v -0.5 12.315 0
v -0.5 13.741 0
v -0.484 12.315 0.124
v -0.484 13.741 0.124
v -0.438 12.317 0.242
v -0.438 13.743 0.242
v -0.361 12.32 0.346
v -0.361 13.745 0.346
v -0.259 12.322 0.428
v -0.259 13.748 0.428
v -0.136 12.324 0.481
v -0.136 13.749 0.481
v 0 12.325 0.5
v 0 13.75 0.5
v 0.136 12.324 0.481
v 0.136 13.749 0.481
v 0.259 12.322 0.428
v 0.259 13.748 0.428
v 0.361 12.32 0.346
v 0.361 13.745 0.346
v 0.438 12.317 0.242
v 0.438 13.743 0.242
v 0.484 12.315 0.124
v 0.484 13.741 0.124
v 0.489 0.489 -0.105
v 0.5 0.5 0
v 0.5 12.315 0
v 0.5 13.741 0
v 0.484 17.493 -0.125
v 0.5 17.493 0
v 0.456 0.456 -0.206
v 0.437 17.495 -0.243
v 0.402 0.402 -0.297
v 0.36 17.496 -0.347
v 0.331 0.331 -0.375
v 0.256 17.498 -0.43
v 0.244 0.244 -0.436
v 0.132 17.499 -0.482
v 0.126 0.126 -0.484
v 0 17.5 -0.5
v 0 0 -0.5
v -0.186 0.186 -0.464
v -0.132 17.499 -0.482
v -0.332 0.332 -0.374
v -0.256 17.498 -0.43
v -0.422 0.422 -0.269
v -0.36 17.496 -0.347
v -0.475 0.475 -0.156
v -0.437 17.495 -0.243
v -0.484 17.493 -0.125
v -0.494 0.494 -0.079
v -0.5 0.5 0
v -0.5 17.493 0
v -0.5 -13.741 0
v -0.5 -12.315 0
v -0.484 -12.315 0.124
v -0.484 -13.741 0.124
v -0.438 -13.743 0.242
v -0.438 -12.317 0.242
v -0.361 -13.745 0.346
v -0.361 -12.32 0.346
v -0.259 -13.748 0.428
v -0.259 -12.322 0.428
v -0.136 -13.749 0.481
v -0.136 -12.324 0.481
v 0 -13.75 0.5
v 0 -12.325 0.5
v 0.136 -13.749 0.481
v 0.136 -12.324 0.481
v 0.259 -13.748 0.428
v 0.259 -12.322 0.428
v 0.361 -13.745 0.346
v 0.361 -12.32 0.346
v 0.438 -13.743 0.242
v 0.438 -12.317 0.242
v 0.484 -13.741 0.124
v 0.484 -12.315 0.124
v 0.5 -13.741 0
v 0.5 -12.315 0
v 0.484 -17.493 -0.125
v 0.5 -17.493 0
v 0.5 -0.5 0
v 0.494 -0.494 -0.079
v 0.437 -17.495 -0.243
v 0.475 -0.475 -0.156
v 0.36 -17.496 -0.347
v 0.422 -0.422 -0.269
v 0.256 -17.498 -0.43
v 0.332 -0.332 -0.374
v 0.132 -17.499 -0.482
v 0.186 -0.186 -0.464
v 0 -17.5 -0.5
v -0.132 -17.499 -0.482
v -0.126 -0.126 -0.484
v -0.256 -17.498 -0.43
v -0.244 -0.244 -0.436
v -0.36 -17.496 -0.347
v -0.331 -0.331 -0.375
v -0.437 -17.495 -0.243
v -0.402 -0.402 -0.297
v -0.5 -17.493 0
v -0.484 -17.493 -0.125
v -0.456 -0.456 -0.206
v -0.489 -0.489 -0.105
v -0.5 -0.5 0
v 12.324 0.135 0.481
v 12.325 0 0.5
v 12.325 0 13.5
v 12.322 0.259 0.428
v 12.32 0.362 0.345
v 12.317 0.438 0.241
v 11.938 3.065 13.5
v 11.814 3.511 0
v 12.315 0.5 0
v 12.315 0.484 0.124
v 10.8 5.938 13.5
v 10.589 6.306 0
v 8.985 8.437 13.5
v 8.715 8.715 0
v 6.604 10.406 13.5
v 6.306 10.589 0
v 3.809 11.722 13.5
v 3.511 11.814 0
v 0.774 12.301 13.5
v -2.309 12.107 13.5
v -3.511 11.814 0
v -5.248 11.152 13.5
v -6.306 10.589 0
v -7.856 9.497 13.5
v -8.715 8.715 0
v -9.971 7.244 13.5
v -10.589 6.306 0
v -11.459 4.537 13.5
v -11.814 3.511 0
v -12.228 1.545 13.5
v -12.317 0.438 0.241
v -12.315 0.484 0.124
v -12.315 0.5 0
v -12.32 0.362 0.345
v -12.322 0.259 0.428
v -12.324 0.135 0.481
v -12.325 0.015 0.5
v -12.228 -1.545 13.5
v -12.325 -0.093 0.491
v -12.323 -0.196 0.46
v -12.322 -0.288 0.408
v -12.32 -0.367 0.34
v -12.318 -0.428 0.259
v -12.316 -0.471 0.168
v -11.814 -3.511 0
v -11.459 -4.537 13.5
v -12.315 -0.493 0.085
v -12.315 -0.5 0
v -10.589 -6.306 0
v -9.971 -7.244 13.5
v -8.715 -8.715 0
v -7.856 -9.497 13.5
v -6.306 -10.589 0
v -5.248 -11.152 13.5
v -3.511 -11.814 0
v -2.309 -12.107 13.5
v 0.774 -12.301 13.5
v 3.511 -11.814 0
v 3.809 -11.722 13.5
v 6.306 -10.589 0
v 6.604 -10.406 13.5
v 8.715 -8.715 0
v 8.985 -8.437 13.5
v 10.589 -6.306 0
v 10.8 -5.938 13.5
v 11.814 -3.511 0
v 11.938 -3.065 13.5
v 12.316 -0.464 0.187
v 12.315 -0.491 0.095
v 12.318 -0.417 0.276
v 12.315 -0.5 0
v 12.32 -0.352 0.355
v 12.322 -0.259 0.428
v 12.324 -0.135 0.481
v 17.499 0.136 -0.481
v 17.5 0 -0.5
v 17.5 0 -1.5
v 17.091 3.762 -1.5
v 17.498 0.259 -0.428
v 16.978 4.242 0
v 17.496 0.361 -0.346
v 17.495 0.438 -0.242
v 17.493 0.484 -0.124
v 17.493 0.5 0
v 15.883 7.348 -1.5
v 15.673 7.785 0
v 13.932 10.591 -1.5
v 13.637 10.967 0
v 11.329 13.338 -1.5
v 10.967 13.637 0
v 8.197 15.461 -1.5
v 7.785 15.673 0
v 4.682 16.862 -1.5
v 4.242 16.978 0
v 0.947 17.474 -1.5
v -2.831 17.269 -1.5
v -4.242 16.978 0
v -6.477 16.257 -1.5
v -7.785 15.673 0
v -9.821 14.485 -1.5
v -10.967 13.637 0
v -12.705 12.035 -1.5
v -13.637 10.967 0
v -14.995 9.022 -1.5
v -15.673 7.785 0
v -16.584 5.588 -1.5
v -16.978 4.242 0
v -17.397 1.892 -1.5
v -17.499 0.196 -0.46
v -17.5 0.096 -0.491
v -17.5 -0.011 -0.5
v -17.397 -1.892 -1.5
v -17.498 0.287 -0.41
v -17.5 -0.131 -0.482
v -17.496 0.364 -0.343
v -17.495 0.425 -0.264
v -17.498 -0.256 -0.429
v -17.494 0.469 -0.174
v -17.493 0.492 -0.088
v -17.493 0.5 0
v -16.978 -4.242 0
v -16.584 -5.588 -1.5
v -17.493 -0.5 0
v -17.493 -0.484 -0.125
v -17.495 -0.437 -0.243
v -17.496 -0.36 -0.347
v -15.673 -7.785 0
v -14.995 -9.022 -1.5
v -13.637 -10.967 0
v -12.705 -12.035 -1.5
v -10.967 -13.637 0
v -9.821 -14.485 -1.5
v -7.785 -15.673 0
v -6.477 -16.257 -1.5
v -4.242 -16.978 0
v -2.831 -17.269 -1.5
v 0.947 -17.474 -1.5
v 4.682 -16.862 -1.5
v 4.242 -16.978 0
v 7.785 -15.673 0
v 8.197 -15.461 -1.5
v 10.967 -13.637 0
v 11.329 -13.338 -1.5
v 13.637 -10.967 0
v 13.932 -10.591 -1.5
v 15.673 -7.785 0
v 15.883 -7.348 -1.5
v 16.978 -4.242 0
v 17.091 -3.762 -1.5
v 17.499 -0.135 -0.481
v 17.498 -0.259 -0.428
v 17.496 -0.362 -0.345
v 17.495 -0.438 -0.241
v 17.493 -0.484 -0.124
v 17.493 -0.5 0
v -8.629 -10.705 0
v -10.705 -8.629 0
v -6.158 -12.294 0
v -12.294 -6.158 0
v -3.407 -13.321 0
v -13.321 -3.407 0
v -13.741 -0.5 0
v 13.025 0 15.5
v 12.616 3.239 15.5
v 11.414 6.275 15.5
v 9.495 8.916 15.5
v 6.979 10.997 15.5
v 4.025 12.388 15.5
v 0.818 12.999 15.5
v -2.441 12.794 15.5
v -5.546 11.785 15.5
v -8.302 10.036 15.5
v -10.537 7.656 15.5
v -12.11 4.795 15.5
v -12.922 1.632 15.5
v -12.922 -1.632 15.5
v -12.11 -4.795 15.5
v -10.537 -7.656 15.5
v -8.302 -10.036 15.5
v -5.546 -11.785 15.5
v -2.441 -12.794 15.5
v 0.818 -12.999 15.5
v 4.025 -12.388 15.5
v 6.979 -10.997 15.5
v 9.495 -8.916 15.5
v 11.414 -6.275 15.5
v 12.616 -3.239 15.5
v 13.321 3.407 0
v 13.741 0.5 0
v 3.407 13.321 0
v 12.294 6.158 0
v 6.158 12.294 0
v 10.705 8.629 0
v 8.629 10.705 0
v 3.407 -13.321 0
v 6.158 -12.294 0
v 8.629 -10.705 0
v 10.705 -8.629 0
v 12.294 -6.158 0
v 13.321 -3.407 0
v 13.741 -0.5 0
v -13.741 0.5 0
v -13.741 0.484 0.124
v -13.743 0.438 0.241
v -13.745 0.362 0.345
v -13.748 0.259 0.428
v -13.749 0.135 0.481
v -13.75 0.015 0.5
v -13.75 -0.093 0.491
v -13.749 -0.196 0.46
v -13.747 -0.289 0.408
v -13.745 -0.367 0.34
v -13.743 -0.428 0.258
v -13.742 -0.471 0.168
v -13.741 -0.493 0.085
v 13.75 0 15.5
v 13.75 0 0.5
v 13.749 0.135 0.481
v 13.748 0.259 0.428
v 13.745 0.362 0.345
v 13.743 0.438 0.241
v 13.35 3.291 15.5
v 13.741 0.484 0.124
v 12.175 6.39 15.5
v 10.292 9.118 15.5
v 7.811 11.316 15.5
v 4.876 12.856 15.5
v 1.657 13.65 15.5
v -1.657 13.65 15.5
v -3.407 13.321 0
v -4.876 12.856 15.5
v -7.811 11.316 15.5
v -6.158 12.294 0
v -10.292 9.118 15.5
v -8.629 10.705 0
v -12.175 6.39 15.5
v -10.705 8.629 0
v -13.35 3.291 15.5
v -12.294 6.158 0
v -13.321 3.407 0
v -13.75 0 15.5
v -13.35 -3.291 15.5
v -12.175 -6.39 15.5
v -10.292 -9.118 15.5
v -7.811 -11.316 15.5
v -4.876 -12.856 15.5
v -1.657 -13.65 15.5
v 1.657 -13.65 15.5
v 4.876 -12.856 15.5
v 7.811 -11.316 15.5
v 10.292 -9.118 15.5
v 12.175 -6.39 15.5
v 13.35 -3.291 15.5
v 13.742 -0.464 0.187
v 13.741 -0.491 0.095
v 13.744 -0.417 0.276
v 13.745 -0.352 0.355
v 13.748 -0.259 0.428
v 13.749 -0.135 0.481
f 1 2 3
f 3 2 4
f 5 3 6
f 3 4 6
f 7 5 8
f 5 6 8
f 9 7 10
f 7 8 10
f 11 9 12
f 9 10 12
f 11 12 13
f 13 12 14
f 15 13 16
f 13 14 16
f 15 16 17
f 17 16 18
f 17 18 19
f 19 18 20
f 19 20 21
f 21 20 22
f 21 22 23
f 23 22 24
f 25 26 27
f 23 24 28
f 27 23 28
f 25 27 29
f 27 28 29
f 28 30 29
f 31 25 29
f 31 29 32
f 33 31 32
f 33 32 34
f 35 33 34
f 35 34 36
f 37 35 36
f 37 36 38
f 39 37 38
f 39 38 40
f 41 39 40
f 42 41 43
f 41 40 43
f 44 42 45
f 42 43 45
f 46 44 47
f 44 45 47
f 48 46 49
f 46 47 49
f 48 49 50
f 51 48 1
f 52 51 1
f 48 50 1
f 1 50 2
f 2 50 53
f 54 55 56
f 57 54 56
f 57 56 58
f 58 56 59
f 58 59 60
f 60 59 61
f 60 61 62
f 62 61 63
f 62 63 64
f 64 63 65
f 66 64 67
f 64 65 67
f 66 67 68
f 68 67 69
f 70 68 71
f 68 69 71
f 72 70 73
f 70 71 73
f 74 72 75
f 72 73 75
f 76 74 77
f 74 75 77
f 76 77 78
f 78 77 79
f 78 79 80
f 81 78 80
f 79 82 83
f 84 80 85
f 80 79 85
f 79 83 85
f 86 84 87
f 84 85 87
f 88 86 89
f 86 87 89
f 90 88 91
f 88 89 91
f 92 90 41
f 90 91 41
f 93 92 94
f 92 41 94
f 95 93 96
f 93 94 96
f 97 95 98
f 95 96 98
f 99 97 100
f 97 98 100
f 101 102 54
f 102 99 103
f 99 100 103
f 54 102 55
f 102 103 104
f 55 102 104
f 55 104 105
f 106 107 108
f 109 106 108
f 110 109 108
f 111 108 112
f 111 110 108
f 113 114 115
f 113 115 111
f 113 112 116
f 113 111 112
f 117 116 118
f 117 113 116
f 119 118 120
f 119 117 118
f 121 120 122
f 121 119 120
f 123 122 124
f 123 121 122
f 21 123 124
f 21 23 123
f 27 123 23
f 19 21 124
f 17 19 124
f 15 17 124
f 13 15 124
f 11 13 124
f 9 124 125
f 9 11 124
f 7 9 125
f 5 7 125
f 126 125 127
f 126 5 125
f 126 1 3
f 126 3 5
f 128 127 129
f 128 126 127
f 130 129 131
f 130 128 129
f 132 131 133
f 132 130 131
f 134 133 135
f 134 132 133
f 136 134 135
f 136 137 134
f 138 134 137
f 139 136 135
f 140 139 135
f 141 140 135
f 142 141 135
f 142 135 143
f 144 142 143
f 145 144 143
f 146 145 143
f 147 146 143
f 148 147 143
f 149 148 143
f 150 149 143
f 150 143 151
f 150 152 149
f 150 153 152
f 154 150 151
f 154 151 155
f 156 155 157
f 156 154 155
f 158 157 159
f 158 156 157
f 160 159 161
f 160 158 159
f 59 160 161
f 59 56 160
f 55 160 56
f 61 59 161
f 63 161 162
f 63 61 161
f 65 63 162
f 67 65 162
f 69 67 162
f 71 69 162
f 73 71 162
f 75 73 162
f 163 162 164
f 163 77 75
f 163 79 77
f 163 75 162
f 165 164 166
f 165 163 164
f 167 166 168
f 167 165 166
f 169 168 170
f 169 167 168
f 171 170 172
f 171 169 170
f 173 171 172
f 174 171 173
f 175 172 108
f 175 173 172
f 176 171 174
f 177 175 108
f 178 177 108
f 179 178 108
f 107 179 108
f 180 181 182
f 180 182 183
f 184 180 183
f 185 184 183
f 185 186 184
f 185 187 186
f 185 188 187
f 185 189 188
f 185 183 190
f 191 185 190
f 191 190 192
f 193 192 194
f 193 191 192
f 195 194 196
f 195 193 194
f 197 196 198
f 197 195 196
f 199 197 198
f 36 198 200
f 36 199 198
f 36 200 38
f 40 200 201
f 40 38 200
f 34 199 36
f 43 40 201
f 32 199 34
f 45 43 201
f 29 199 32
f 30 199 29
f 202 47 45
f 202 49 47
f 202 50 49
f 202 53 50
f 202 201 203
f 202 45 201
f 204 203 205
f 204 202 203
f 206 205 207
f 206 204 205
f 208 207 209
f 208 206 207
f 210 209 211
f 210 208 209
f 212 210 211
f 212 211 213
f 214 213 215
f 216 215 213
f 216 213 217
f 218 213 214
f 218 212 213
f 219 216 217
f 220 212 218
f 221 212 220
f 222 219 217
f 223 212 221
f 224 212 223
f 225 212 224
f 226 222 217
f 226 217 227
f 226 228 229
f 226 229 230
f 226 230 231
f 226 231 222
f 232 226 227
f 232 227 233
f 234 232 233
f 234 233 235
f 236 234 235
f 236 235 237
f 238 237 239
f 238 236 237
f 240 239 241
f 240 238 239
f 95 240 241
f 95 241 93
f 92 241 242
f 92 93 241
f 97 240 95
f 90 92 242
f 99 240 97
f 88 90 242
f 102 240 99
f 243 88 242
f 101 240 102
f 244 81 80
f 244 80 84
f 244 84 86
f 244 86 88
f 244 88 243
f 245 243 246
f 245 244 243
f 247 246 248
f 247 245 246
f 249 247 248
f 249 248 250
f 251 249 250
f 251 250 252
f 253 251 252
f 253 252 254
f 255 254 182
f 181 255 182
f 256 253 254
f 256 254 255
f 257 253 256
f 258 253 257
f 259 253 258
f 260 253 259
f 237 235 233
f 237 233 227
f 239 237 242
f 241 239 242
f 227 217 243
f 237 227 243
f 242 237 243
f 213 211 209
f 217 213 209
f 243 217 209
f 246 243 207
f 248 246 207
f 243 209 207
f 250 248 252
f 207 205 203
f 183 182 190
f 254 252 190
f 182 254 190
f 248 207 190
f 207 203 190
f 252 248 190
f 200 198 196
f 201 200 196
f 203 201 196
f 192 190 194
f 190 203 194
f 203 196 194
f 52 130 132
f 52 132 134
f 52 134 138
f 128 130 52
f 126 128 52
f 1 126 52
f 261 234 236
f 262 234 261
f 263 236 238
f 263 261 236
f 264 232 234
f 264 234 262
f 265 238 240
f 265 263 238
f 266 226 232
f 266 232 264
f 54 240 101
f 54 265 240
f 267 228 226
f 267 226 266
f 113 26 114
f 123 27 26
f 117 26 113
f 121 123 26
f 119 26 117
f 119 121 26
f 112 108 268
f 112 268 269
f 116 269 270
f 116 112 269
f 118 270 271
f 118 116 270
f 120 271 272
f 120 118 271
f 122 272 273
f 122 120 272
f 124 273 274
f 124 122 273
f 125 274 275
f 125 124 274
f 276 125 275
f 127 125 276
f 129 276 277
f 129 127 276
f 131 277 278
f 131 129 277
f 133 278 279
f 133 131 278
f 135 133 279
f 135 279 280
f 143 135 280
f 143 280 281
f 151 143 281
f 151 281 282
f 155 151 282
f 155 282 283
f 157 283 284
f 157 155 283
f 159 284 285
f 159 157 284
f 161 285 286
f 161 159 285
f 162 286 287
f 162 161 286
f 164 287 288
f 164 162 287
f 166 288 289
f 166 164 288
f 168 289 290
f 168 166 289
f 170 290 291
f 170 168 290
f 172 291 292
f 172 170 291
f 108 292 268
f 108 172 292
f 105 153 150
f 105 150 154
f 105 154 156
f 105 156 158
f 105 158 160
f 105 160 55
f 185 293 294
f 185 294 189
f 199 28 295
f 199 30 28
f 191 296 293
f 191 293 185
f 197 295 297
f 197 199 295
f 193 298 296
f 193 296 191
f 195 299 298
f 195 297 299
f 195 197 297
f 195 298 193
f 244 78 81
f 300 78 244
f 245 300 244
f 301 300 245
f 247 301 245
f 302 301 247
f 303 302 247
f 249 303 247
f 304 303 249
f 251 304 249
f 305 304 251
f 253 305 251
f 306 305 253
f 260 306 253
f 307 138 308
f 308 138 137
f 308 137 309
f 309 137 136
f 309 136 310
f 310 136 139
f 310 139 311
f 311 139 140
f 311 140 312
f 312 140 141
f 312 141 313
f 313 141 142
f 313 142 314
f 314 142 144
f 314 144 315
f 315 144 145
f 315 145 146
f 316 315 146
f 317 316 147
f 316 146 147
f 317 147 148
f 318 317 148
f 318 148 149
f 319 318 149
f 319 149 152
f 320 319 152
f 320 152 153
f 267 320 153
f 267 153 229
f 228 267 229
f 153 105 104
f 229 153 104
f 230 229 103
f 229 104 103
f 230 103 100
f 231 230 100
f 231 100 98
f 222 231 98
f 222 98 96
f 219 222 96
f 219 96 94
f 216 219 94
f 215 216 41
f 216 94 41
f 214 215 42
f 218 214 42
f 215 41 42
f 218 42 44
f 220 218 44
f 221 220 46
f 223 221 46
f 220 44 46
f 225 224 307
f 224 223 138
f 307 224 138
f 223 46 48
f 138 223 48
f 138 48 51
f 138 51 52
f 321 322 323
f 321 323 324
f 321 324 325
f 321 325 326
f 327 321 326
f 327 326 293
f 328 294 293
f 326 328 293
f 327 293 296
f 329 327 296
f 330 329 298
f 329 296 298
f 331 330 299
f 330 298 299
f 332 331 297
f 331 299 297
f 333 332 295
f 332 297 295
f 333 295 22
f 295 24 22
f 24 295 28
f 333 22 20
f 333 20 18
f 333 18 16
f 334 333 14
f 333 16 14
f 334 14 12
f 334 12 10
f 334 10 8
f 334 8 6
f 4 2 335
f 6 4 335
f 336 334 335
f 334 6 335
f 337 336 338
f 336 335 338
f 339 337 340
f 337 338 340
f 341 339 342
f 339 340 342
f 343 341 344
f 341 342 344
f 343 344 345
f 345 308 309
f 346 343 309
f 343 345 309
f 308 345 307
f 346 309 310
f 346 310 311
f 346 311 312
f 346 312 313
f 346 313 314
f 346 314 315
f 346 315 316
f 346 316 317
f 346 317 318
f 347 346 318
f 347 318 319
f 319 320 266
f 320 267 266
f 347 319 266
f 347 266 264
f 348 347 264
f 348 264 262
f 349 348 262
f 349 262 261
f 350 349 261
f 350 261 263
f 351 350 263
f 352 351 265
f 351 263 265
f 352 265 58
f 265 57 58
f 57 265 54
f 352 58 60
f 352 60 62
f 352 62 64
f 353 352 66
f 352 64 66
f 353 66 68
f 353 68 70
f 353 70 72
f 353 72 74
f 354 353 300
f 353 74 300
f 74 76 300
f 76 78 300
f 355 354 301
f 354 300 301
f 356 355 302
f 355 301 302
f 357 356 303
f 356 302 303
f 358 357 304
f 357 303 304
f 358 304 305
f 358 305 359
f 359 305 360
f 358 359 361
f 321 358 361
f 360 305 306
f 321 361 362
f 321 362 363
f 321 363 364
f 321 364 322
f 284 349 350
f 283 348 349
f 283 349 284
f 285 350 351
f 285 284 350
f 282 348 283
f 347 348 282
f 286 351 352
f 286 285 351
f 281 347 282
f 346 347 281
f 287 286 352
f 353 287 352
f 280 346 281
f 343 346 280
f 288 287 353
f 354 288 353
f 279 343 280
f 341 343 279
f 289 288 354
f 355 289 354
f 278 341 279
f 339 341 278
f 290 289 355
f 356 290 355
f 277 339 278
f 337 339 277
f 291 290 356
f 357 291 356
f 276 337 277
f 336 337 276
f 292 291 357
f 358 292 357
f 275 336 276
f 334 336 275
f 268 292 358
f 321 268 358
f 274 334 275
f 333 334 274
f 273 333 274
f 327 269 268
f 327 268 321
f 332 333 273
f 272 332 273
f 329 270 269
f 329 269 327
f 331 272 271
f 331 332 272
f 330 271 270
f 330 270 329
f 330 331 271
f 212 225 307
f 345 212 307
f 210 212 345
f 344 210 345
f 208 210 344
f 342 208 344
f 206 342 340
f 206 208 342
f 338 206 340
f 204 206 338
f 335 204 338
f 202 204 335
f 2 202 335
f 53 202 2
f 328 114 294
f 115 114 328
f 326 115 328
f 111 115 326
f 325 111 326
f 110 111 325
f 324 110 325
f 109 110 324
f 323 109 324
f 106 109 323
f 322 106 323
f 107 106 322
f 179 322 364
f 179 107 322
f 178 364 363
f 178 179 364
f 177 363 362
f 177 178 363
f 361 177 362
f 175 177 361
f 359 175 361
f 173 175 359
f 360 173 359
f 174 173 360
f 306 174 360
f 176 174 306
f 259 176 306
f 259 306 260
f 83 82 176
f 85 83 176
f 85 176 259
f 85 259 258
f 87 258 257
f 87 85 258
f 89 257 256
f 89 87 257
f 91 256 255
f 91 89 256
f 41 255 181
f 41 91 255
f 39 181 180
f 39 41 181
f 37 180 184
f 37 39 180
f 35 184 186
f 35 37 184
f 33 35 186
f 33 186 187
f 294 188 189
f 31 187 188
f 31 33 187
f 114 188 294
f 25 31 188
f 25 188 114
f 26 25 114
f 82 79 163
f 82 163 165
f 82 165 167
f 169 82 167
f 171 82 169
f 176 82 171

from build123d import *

# Parameters (mm, degrees)
SKETCH_R           = 13.75
SKETCH_R_2         = 12.325
PAD_DEPTH          = 15.5
SKETCH001_R        = 17.5
PAD001_DEPTH       = 1.5
CHAMFER_SIZE2      = 2
CHAMFER_SIZE       = 0.7
SKETCH002_R        = 0.5
POCKET_DEPTH       = 122.171913
POCKET_DEPTH_BACK  = 122.171913
POLARPATTERN_COUNT = 2
POLARPATTERN_ANGLE = 90


with BuildPart() as part:
    # Sketch → Pad (new body)
    with BuildSketch(Plane.XY):
        Circle(SKETCH_R)
        Circle(SKETCH_R_2, mode=Mode.SUBTRACT)
    extrude(amount=PAD_DEPTH)

    # Sketch001 → Pad001 (join)
    with BuildSketch(Plane.XY):
        Circle(SKETCH001_R)
    extrude(amount=-PAD001_DEPTH)

    # Chamfer
    chamfer_edges = [part.edges().sort_by_distance(p)[0] for p in [
        (-12.325, 0, 15.5),
    ]]
    chamfer_side = part.faces().sort_by_distance((-13.361091, 0, 15.5))[0]
    chamfer(chamfer_edges, length=CHAMFER_SIZE, length2=CHAMFER_SIZE2, reference=chamfer_side)

    # Sketch002 → Pocket (cut, two sides)
    with BuildSketch(Plane.YZ) as pocket_sk:
        Circle(SKETCH002_R)
    pocket = extrude(amount=-POCKET_DEPTH, mode=Mode.SUBTRACT) + extrude(pocket_sk.sketch, amount=POCKET_DEPTH_BACK, mode=Mode.SUBTRACT)

    # PolarPattern: Pocket ×2 about axis
    polarpattern_axis = Axis((0, 0, 0), (0, 0, 1))
    for i in range(1, POLARPATTERN_COUNT):
        add(pocket.rotate(polarpattern_axis, i * POLARPATTERN_ANGLE / (POLARPATTERN_COUNT - 1)), mode=Mode.SUBTRACT)


solid = part.part
